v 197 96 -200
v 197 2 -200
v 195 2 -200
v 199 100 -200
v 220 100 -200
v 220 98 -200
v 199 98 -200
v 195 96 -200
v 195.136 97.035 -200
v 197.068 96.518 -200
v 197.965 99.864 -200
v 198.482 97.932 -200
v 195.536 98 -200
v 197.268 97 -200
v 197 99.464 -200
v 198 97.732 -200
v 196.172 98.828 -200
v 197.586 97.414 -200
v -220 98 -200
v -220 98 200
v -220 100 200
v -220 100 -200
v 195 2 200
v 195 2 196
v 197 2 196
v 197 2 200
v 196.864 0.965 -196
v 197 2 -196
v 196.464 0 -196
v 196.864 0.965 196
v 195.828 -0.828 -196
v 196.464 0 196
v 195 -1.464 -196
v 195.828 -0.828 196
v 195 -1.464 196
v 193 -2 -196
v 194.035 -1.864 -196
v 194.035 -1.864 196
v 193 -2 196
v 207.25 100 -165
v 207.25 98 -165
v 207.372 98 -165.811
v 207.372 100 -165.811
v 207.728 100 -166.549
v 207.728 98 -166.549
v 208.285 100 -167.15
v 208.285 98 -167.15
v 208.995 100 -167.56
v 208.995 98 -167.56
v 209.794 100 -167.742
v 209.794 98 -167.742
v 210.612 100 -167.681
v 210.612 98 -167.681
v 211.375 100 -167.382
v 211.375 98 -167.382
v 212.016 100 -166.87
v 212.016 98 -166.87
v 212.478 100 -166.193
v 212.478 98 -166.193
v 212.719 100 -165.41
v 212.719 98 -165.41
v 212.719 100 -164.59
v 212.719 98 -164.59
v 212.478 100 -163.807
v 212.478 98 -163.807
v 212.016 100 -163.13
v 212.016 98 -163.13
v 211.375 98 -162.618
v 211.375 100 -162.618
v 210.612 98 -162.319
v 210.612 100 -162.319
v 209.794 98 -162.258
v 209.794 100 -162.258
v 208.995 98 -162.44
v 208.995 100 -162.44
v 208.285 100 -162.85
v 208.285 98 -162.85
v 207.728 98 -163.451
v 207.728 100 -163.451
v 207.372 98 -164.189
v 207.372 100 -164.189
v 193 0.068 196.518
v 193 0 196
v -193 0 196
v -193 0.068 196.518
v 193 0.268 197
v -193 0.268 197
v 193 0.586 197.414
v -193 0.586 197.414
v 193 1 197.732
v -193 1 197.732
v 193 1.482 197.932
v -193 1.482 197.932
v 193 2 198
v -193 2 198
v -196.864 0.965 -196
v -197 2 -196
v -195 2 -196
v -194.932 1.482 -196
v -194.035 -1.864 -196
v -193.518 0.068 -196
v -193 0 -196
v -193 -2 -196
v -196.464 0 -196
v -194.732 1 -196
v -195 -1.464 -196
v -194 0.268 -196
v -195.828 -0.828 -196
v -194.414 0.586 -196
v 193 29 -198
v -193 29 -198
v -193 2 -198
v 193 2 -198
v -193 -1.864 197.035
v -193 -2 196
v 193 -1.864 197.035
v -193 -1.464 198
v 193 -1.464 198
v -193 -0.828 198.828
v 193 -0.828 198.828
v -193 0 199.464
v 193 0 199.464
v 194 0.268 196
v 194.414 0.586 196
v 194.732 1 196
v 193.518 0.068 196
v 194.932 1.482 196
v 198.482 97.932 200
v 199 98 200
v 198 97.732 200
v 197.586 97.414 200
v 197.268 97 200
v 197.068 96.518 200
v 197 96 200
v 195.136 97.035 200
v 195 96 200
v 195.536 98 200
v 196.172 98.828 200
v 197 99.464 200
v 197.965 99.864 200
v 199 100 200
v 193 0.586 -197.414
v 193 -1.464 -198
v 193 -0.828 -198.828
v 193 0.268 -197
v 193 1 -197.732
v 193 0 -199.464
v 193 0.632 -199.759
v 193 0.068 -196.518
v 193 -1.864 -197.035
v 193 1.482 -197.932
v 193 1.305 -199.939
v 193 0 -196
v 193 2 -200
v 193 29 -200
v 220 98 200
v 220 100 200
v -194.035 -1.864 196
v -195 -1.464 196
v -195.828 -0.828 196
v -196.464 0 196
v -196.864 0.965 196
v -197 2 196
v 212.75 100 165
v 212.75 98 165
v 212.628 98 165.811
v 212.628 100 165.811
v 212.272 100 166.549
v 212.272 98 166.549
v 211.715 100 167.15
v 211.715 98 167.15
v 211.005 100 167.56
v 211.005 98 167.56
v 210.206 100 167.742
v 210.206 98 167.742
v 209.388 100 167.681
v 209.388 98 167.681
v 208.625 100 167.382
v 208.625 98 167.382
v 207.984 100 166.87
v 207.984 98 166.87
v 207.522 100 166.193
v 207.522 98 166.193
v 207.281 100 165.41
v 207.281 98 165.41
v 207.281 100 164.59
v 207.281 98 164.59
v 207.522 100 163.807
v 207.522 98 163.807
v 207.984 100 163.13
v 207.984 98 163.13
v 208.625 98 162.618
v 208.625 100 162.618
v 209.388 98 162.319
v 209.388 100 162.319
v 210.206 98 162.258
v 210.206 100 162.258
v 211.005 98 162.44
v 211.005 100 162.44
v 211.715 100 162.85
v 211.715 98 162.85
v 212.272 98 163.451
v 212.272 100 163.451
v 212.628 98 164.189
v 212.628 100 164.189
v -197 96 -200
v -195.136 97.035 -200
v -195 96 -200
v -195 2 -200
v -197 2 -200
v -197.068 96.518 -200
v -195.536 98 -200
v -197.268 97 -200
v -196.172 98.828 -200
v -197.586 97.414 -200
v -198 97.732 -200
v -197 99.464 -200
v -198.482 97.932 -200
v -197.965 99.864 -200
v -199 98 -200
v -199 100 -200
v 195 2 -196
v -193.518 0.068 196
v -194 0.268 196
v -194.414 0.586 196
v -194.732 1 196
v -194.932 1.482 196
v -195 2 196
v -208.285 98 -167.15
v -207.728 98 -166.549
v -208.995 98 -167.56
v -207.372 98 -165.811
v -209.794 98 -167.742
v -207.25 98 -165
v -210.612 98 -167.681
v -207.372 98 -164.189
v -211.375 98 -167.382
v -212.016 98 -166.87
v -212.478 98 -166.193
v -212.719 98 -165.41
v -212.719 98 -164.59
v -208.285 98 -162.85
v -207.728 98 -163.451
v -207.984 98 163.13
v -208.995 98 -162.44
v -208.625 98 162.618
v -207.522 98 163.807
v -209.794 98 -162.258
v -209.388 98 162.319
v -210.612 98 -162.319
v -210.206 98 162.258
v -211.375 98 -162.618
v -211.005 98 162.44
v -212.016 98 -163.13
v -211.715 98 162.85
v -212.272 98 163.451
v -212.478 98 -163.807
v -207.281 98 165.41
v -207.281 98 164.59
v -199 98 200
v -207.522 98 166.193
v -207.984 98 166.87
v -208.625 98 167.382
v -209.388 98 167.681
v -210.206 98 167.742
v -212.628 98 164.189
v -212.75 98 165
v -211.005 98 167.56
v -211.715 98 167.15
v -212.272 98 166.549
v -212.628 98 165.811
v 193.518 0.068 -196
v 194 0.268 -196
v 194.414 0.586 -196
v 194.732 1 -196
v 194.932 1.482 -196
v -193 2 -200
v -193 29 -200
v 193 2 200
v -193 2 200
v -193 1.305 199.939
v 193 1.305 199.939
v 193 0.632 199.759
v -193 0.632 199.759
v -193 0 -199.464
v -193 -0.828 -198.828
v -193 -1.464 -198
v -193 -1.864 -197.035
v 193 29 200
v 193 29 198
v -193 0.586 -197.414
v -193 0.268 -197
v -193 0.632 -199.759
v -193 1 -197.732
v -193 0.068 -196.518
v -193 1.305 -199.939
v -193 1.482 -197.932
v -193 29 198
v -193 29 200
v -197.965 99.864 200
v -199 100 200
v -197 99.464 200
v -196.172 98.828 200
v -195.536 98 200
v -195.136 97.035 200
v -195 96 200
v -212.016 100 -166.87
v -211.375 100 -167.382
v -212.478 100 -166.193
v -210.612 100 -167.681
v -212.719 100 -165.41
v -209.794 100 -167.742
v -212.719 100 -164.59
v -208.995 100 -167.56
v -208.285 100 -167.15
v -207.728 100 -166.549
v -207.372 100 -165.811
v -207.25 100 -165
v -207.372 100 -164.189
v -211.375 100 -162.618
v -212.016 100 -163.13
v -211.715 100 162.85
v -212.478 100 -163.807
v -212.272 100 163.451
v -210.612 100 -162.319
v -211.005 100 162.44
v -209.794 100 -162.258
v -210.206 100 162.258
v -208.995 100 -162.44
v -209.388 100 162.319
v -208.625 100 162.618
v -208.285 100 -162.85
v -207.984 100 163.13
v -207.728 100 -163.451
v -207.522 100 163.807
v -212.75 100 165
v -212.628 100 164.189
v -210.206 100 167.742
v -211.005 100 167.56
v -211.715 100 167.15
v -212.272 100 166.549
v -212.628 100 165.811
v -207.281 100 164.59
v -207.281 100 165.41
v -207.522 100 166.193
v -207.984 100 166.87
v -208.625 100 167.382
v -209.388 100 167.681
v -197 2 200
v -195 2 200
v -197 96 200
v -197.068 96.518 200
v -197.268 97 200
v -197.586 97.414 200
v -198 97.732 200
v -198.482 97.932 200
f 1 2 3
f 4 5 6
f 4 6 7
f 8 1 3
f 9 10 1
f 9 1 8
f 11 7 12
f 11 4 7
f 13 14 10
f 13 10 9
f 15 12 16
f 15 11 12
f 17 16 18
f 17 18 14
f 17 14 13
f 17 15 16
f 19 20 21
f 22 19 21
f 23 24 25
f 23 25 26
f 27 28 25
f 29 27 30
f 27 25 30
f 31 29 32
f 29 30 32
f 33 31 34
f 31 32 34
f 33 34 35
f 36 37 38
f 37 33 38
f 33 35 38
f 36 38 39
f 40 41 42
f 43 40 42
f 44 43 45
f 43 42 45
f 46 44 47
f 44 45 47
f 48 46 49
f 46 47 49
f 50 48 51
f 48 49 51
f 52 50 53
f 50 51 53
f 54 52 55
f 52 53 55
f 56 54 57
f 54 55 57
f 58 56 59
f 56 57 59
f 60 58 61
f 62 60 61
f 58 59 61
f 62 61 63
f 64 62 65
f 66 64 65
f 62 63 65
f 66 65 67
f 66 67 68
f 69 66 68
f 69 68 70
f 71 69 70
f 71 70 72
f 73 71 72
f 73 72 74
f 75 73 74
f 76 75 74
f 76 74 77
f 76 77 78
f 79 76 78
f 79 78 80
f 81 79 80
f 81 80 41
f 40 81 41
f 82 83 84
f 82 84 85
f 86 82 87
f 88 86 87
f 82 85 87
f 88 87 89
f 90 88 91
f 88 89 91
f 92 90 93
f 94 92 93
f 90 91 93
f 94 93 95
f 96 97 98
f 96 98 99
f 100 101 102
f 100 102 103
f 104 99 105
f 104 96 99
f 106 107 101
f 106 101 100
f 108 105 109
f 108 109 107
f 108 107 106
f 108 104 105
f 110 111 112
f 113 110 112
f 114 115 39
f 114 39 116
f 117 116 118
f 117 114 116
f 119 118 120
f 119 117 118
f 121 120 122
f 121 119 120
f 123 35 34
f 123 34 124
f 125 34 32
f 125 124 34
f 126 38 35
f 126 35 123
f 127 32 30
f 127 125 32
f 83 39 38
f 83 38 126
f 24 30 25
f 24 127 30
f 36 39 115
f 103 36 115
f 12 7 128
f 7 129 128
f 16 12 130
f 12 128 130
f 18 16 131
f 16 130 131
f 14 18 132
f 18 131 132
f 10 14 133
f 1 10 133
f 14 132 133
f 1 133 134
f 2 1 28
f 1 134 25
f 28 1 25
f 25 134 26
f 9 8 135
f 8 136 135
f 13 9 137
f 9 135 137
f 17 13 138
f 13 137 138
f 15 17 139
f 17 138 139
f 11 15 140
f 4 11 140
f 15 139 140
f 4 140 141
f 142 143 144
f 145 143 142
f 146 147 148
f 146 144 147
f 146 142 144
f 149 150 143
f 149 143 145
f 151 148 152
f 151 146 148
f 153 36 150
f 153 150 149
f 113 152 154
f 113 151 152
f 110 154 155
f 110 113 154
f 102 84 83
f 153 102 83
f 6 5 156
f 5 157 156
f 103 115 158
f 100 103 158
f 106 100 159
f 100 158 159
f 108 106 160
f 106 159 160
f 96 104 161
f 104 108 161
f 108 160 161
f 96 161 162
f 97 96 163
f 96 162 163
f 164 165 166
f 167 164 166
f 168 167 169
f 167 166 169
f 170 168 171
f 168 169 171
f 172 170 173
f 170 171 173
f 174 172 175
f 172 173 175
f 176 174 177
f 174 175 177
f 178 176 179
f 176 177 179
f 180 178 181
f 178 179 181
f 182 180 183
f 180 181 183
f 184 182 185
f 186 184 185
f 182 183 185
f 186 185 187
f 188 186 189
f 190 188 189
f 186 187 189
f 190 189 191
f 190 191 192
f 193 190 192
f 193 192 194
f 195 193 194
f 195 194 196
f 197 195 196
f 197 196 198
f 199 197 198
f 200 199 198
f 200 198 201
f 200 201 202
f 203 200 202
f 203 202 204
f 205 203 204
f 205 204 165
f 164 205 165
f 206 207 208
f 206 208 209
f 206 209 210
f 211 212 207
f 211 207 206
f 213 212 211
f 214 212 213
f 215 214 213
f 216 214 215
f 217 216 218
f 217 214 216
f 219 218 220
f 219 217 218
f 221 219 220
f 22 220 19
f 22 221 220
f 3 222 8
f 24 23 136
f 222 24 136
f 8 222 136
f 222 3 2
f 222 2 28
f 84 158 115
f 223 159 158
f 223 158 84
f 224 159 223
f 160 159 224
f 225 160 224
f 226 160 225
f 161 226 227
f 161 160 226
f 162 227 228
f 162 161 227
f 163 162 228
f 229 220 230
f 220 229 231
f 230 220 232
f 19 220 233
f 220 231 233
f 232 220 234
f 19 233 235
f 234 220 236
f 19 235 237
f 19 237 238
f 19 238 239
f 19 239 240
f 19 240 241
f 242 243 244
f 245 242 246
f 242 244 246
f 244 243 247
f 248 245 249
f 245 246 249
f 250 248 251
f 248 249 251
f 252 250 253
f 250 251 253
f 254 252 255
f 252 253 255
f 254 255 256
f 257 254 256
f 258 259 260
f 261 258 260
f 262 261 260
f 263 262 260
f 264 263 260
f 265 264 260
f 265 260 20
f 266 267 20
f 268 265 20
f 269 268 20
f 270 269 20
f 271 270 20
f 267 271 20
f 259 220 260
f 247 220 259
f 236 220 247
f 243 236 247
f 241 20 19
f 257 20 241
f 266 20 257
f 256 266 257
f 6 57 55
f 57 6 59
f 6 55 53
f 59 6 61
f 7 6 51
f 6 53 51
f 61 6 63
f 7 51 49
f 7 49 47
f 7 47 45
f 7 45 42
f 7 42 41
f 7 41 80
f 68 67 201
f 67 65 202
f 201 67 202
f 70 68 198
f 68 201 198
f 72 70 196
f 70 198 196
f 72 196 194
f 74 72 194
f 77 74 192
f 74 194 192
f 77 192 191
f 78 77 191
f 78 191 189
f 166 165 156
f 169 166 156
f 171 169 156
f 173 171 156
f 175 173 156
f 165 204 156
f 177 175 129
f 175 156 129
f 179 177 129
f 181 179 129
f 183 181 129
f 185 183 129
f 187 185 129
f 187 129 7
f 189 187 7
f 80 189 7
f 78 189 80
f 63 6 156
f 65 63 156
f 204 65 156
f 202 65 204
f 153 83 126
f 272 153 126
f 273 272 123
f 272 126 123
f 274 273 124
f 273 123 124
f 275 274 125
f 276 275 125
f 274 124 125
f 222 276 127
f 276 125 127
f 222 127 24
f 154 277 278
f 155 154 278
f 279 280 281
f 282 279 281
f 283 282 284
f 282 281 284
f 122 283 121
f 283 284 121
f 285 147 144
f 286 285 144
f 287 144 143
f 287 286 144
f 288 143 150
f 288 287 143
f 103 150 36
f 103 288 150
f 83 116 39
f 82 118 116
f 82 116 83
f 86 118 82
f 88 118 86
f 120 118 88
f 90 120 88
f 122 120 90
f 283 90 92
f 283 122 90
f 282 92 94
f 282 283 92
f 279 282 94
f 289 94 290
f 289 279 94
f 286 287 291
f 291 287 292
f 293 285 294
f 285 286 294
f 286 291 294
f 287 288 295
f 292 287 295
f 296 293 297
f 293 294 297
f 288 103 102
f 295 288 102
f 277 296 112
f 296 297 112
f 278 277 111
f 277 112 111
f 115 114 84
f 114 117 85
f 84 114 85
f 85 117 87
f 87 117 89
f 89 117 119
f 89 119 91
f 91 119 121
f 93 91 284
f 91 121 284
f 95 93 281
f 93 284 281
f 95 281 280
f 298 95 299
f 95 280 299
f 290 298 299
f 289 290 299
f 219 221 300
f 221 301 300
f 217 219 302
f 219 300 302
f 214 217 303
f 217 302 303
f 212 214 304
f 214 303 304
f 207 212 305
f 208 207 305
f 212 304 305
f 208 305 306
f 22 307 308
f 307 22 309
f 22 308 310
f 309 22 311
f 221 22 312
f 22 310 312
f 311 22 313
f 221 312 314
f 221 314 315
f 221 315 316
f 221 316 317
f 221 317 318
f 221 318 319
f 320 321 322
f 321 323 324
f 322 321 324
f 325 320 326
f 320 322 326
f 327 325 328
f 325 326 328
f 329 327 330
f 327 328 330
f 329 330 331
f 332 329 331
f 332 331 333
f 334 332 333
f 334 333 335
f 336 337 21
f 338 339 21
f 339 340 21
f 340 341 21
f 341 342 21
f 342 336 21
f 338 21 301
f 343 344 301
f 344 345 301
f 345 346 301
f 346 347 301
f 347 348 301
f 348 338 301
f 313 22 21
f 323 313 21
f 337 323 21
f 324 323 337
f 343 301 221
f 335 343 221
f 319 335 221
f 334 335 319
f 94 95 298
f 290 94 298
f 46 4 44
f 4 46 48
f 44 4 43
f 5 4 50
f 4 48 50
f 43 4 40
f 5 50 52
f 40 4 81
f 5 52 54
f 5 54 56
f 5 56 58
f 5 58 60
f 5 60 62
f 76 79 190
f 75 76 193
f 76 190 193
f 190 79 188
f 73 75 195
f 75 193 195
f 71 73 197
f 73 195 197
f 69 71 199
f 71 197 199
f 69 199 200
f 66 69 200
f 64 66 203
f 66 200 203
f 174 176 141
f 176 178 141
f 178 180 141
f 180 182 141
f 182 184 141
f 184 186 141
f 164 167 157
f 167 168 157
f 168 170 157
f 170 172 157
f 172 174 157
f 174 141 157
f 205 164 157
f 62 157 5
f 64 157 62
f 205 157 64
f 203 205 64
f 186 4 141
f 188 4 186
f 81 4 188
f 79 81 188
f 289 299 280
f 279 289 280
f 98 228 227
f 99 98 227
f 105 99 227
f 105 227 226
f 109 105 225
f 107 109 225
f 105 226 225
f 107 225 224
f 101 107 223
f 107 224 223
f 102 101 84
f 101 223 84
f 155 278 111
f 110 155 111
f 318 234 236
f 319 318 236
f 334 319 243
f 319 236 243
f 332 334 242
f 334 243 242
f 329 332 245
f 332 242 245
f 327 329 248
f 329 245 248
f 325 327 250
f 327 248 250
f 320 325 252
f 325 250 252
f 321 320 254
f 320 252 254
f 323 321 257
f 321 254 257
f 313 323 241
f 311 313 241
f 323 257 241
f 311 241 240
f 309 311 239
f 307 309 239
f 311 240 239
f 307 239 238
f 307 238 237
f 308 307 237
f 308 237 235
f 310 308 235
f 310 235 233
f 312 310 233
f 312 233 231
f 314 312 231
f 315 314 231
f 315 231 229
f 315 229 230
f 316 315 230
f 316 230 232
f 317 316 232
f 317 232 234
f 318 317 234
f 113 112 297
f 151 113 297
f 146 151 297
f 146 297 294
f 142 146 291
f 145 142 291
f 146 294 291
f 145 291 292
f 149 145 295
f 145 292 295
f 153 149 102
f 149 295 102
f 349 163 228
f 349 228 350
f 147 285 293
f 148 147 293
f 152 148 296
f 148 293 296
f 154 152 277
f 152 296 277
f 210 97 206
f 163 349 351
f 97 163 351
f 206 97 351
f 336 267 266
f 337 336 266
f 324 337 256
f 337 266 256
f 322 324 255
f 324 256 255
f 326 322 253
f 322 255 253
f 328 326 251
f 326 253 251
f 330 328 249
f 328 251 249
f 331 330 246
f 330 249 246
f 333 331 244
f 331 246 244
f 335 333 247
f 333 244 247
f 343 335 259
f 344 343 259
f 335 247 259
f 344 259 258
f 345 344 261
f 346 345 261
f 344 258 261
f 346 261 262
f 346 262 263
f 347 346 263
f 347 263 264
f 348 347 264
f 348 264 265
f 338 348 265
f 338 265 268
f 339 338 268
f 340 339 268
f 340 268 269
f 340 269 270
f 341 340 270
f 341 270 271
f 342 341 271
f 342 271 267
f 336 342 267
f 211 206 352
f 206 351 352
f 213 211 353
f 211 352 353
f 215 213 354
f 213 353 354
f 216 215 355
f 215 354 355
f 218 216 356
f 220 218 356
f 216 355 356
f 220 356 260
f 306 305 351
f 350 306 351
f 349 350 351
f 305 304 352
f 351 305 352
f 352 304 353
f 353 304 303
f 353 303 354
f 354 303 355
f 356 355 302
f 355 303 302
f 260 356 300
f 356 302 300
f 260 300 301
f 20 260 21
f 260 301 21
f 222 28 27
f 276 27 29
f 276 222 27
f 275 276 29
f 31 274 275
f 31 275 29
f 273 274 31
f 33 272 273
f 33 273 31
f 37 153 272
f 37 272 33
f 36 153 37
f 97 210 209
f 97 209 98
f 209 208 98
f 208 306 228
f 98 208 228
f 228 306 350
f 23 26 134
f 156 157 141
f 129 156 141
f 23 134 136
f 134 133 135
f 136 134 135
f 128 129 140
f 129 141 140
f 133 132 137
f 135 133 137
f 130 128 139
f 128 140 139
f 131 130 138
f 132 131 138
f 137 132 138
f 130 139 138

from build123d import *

# Parameters (mm, degrees)
SM_BASE_FLANGE_1_DEPTH   = 200
SM_START                 = -197
SM_EDGE_FLANGE_1_DEPTH   = 394
SM_EDGE_FLANGE_1_2_DEPTH = 4
SM_START_2               = 193
SM_EDGE_FLANGE_1_3_DEPTH = 4
SM_START_3               = -193
SM_EDGE_FLANGE_1_4_DEPTH = 386
SKETCH_12_R              = 2.75
CUT_EXTRUDE_1_DEPTH      = 314.687742827


# Read off the part's stored shape, not the designer's step: Ребро-кромка1
# Sheet-metal steps are written as plain solids
with BuildPart() as part:
    # Sketch 1 → Базовая кромка1 (new, symmetric)
    with BuildSketch(Plane.XY):
        with BuildLine():
            Line((-220, 100), (-199, 100))
            ThreePointArc((-199, 100), (-196.171572875, 98.828427125), (-195, 96))
            Line((-195, 96), (-195, 2))
            ThreePointArc((-195, 2), (-194.414213562, 0.585786438), (-193, 0))
            Line((-193, 0), (193, 0))
            ThreePointArc((193, 0), (194.414213562, 0.585786438), (195, 2))
            Line((195, 2), (195, 96))
            ThreePointArc((195, 96), (196.171572875, 98.828427125), (199, 100))
            Line((199, 100), (220, 100))
            Line((220, 100), (220, 98))
            Line((220, 98), (199, 98))
            ThreePointArc((199, 98), (197.585786438, 97.414213562), (197, 96))
            Line((197, 96), (197, 2))
            ThreePointArc((197, 2), (195.828427125, -0.828427125), (193, -2))
            Line((193, -2), (-193, -2))
            ThreePointArc((-193, -2), (-195.828427125, -0.828427125), (-197, 2))
            Line((-197, 2), (-197, 96))
            ThreePointArc((-197, 96), (-197.585786438, 97.414213562), (-199, 98))
            Line((-199, 98), (-220, 98))
            Line((-220, 98), (-220, 100))
        make_face()
    extrude(amount=SM_BASE_FLANGE_1_DEPTH, both=True)

    # Ребро-кромка1 outline → Ребро-кромка1 (cut)
    with BuildSketch(Plane.YZ.offset(SM_START)):
        with BuildLine():
            ThreePointArc((2, -200), (-0.828427125, -198.828427125), (-2, -196))
            Line((-2, -196), (-2, -200))
            Line((-2, -200), (2, -200))
        make_face()
        with BuildLine():
            ThreePointArc((0, -196), (0.585786438, -197.414213562), (2, -198))
            Line((2, -198), (2, -196))
            Line((2, -196), (0, -196))
        make_face()
        with BuildLine():
            ThreePointArc((2, 198), (0.585786438, 197.414213562), (0, 196))
            Line((0, 196), (2, 196))
            Line((2, 196), (2, 198))
        make_face()
        with BuildLine():
            Line((-2, 200), (-2, 196))
            ThreePointArc((-2, 196), (-0.828427125, 198.828427125), (2, 200))
            Line((2, 200), (-2, 200))
        make_face()
    extrude(amount=SM_EDGE_FLANGE_1_DEPTH, mode=Mode.SUBTRACT)

    # Sm Edge Flange 1 2 outline → Sm Edge Flange 1 2 (cut)
    with BuildSketch(Plane.YZ.offset(SM_START)):
        with BuildLine():
            Line((2, -200), (2, -198))
            ThreePointArc((2, -198), (0.585786438, -197.414213562), (0, -196))
            Line((0, -196), (-2, -196))
            ThreePointArc((-2, -196), (-0.828427125, -198.828427125), (2, -200))
        make_face()
        with BuildLine():
            ThreePointArc((2, 200), (-0.828427125, 198.828427125), (-2, 196))
            Line((-2, 196), (0, 196))
            ThreePointArc((0, 196), (0.585786438, 197.414213562), (2, 198))
            Line((2, 198), (2, 200))
        make_face()
    extrude(amount=SM_EDGE_FLANGE_1_2_DEPTH, mode=Mode.SUBTRACT)

    # Sm Edge Flange 1 3 outline → Sm Edge Flange 1 3 (cut)
    with BuildSketch(Plane.YZ.offset(SM_START_2)):
        with BuildLine():
            Line((2, -200), (2, -198))
            ThreePointArc((2, -198), (0.585786438, -197.414213562), (0, -196))
            Line((0, -196), (-2, -196))
            ThreePointArc((-2, -196), (-0.828427125, -198.828427125), (2, -200))
        make_face()
        with BuildLine():
            ThreePointArc((2, 200), (-0.828427125, 198.828427125), (-2, 196))
            Line((-2, 196), (0, 196))
            ThreePointArc((0, 196), (0.585786438, 197.414213562), (2, 198))
            Line((2, 198), (2, 200))
        make_face()
    extrude(amount=SM_EDGE_FLANGE_1_3_DEPTH, mode=Mode.SUBTRACT)

    # Sm Edge Flange 1 4 outline → Sm Edge Flange 1 4 (add)
    with BuildSketch(Plane.YZ.offset(SM_START_3)):
        with BuildLine():
            ThreePointArc((0, -199.464101616), (0.96472382, -199.863703305), (2, -200))
            Line((2, -200), (29, -200))
            Line((29, -200), (29, -198))
            Line((29, -198), (2, -198))
            ThreePointArc((2, -198), (0.585786438, -197.414213562), (0, -196))
            Line((0, -196), (0, -199.464101616))
        make_face()
        with BuildLine():
            Line((0, 199.464101616), (0, 196))
            ThreePointArc((0, 196), (0.585786438, 197.414213562), (2, 198))
            Line((2, 198), (29, 198))
            Line((29, 198), (29, 200))
            Line((29, 200), (2, 200))
            ThreePointArc((2, 200), (0.96472382, 199.863703305), (0, 199.464101616))
        make_face()
    extrude(amount=SM_EDGE_FLANGE_1_4_DEPTH)

    # Эскиз12 → Вырез-Вытянуть1 (cut, through all)
    with BuildSketch(Plane.XZ.offset(-98)):
        with Locations((210, 165)):
            Circle(SKETCH_12_R)
        with Locations(Location((-210, 165, 0), (0, 0, 180))):
            Circle(SKETCH_12_R)
        with Locations(Location((210, -165, 0), (0, 0, 180))):
            Circle(SKETCH_12_R)
        with Locations((-210, -165)):
            Circle(SKETCH_12_R)
    extrude(amount=-CUT_EXTRUDE_1_DEPTH, mode=Mode.SUBTRACT)


solid = part.part
